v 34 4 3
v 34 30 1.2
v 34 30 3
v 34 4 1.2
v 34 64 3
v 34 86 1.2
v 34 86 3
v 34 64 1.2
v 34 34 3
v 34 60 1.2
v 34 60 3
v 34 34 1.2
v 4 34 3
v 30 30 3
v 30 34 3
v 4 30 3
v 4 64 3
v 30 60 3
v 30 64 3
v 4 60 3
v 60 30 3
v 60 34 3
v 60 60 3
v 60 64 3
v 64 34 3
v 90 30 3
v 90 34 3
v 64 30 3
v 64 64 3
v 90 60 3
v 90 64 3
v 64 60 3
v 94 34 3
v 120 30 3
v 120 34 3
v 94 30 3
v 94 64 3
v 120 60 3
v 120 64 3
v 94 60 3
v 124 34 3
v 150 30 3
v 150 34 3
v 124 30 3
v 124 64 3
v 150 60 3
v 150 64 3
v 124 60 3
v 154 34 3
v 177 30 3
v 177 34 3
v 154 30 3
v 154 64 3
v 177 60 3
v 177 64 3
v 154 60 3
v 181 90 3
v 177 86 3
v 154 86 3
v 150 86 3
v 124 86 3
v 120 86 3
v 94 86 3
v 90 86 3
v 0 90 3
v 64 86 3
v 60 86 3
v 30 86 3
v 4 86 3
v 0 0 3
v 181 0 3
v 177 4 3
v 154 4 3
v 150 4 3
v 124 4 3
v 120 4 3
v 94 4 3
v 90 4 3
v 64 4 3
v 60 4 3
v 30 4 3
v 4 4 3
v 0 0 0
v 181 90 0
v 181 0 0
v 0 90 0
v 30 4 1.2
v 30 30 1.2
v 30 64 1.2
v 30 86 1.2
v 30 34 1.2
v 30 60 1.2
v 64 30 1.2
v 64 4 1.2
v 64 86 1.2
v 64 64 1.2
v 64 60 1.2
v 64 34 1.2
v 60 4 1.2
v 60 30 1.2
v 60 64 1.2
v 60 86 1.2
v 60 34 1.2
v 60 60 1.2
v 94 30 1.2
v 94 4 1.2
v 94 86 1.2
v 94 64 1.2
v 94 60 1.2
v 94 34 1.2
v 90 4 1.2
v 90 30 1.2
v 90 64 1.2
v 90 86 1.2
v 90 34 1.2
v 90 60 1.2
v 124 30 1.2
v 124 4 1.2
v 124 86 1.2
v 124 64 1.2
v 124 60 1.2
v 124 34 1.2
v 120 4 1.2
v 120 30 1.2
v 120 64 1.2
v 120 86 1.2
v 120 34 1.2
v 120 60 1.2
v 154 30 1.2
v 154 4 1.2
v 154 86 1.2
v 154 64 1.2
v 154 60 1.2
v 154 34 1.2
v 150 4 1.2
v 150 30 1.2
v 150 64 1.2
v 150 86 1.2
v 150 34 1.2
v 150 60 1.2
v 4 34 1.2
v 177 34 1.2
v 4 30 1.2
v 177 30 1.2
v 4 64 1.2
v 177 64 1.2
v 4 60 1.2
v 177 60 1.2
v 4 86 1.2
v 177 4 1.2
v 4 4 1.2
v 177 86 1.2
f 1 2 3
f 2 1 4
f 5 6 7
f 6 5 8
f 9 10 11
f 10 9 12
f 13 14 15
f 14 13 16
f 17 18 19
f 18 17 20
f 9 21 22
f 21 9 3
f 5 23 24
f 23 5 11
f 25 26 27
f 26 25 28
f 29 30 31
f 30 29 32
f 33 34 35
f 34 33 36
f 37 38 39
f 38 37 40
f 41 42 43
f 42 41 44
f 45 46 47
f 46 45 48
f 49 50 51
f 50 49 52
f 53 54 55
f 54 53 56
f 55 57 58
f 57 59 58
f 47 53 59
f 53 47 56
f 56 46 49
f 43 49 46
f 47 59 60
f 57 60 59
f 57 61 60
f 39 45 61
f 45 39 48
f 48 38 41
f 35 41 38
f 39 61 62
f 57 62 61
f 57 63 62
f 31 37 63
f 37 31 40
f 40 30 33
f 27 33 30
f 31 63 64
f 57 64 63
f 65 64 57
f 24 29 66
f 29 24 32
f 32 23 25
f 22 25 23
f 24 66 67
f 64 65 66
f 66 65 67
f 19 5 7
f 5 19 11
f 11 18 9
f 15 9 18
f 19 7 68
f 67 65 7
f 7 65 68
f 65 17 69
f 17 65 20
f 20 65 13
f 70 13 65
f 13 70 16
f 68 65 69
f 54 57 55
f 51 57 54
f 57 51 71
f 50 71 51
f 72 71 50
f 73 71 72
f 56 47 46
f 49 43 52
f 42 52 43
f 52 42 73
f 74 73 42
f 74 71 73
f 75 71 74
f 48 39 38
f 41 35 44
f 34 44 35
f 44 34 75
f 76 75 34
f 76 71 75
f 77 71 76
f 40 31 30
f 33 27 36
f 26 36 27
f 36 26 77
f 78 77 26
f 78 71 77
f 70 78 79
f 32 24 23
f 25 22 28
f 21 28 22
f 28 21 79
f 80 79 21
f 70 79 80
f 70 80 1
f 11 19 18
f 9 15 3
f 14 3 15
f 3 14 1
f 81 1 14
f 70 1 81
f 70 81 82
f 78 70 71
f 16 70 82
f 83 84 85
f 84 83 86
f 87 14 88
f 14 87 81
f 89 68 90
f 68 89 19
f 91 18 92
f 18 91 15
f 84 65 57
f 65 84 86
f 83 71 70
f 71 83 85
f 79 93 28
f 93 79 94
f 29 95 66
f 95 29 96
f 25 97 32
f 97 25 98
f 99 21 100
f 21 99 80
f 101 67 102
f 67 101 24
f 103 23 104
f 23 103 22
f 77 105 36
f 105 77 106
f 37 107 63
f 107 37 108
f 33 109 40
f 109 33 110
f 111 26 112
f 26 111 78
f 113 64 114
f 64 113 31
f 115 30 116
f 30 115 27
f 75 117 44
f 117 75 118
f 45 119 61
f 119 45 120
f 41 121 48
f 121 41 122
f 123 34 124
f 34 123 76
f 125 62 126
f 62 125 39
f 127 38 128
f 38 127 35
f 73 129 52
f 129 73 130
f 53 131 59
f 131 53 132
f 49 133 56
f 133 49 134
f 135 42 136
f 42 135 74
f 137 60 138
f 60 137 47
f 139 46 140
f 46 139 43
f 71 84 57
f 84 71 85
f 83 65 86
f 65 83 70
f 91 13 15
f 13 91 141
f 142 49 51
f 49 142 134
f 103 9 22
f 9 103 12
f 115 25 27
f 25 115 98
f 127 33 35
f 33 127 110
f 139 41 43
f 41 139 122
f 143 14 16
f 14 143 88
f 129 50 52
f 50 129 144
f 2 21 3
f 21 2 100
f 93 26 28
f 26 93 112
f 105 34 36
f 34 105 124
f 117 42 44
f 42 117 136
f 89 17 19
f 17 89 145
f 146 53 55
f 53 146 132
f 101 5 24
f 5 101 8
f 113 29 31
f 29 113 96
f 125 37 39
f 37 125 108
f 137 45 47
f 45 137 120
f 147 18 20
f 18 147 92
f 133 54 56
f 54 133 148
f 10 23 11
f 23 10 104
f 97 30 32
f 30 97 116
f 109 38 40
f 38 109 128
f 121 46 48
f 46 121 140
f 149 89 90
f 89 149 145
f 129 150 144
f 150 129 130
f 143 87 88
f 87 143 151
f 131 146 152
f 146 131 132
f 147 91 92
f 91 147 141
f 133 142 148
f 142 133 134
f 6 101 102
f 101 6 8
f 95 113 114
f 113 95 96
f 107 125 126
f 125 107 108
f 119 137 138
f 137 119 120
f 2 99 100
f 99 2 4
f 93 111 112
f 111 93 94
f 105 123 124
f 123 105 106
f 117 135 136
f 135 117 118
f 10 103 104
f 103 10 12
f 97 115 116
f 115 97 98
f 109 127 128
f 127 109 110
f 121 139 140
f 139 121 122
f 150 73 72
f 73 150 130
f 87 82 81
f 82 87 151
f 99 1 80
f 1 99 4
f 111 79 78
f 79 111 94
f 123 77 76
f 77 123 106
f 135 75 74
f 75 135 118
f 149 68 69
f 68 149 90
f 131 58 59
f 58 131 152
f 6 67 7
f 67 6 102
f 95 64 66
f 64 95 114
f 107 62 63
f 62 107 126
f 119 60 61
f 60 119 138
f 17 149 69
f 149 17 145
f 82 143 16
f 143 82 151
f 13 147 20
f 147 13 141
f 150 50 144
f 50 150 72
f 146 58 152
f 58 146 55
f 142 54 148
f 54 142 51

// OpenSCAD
// Elumara lamp-base mold box
// Export two copies of each panel. Units: mm.

part = "long"; // "long", "short", or "layout"

inside_width = 175;
inside_height = 90;
skin = 1.2;
rib_depth = 3;
rib_width = 4;
corner_overlap = 3;

module ribbed_panel(width) {
    union() {
        cube([width, inside_height, skin]);

        // Perimeter ribs resist bowing under silicone pressure.
        cube([width, rib_width, rib_depth]);
        translate([0, inside_height - rib_width, 0])
            cube([width, rib_width, rib_depth]);
        cube([rib_width, inside_height, rib_depth]);
        translate([width - rib_width, 0, 0])
            cube([rib_width, inside_height, rib_depth]);

        for (x = [30 : 30 : width - 20])
            translate([x, 0, 0]) cube([rib_width, inside_height, rib_depth]);

        for (y = [30 : 30 : inside_height - 20])
            translate([0, y, 0]) cube([width, rib_width, rib_depth]);
    }
}

module long_panel() {
    ribbed_panel(inside_width + 2 * corner_overlap);
}

module short_panel() {
    ribbed_panel(inside_width);
}

if (part == "long") {
    long_panel();
} else if (part == "short") {
    short_panel();
} else {
    long_panel();
    translate([0, inside_height + 8, 0]) long_panel();
    translate([inside_width + 2 * corner_overlap + 8, 0, 0]) short_panel();
    translate([inside_width + 2 * corner_overlap + 8, inside_height + 8, 0])
        short_panel();
}
